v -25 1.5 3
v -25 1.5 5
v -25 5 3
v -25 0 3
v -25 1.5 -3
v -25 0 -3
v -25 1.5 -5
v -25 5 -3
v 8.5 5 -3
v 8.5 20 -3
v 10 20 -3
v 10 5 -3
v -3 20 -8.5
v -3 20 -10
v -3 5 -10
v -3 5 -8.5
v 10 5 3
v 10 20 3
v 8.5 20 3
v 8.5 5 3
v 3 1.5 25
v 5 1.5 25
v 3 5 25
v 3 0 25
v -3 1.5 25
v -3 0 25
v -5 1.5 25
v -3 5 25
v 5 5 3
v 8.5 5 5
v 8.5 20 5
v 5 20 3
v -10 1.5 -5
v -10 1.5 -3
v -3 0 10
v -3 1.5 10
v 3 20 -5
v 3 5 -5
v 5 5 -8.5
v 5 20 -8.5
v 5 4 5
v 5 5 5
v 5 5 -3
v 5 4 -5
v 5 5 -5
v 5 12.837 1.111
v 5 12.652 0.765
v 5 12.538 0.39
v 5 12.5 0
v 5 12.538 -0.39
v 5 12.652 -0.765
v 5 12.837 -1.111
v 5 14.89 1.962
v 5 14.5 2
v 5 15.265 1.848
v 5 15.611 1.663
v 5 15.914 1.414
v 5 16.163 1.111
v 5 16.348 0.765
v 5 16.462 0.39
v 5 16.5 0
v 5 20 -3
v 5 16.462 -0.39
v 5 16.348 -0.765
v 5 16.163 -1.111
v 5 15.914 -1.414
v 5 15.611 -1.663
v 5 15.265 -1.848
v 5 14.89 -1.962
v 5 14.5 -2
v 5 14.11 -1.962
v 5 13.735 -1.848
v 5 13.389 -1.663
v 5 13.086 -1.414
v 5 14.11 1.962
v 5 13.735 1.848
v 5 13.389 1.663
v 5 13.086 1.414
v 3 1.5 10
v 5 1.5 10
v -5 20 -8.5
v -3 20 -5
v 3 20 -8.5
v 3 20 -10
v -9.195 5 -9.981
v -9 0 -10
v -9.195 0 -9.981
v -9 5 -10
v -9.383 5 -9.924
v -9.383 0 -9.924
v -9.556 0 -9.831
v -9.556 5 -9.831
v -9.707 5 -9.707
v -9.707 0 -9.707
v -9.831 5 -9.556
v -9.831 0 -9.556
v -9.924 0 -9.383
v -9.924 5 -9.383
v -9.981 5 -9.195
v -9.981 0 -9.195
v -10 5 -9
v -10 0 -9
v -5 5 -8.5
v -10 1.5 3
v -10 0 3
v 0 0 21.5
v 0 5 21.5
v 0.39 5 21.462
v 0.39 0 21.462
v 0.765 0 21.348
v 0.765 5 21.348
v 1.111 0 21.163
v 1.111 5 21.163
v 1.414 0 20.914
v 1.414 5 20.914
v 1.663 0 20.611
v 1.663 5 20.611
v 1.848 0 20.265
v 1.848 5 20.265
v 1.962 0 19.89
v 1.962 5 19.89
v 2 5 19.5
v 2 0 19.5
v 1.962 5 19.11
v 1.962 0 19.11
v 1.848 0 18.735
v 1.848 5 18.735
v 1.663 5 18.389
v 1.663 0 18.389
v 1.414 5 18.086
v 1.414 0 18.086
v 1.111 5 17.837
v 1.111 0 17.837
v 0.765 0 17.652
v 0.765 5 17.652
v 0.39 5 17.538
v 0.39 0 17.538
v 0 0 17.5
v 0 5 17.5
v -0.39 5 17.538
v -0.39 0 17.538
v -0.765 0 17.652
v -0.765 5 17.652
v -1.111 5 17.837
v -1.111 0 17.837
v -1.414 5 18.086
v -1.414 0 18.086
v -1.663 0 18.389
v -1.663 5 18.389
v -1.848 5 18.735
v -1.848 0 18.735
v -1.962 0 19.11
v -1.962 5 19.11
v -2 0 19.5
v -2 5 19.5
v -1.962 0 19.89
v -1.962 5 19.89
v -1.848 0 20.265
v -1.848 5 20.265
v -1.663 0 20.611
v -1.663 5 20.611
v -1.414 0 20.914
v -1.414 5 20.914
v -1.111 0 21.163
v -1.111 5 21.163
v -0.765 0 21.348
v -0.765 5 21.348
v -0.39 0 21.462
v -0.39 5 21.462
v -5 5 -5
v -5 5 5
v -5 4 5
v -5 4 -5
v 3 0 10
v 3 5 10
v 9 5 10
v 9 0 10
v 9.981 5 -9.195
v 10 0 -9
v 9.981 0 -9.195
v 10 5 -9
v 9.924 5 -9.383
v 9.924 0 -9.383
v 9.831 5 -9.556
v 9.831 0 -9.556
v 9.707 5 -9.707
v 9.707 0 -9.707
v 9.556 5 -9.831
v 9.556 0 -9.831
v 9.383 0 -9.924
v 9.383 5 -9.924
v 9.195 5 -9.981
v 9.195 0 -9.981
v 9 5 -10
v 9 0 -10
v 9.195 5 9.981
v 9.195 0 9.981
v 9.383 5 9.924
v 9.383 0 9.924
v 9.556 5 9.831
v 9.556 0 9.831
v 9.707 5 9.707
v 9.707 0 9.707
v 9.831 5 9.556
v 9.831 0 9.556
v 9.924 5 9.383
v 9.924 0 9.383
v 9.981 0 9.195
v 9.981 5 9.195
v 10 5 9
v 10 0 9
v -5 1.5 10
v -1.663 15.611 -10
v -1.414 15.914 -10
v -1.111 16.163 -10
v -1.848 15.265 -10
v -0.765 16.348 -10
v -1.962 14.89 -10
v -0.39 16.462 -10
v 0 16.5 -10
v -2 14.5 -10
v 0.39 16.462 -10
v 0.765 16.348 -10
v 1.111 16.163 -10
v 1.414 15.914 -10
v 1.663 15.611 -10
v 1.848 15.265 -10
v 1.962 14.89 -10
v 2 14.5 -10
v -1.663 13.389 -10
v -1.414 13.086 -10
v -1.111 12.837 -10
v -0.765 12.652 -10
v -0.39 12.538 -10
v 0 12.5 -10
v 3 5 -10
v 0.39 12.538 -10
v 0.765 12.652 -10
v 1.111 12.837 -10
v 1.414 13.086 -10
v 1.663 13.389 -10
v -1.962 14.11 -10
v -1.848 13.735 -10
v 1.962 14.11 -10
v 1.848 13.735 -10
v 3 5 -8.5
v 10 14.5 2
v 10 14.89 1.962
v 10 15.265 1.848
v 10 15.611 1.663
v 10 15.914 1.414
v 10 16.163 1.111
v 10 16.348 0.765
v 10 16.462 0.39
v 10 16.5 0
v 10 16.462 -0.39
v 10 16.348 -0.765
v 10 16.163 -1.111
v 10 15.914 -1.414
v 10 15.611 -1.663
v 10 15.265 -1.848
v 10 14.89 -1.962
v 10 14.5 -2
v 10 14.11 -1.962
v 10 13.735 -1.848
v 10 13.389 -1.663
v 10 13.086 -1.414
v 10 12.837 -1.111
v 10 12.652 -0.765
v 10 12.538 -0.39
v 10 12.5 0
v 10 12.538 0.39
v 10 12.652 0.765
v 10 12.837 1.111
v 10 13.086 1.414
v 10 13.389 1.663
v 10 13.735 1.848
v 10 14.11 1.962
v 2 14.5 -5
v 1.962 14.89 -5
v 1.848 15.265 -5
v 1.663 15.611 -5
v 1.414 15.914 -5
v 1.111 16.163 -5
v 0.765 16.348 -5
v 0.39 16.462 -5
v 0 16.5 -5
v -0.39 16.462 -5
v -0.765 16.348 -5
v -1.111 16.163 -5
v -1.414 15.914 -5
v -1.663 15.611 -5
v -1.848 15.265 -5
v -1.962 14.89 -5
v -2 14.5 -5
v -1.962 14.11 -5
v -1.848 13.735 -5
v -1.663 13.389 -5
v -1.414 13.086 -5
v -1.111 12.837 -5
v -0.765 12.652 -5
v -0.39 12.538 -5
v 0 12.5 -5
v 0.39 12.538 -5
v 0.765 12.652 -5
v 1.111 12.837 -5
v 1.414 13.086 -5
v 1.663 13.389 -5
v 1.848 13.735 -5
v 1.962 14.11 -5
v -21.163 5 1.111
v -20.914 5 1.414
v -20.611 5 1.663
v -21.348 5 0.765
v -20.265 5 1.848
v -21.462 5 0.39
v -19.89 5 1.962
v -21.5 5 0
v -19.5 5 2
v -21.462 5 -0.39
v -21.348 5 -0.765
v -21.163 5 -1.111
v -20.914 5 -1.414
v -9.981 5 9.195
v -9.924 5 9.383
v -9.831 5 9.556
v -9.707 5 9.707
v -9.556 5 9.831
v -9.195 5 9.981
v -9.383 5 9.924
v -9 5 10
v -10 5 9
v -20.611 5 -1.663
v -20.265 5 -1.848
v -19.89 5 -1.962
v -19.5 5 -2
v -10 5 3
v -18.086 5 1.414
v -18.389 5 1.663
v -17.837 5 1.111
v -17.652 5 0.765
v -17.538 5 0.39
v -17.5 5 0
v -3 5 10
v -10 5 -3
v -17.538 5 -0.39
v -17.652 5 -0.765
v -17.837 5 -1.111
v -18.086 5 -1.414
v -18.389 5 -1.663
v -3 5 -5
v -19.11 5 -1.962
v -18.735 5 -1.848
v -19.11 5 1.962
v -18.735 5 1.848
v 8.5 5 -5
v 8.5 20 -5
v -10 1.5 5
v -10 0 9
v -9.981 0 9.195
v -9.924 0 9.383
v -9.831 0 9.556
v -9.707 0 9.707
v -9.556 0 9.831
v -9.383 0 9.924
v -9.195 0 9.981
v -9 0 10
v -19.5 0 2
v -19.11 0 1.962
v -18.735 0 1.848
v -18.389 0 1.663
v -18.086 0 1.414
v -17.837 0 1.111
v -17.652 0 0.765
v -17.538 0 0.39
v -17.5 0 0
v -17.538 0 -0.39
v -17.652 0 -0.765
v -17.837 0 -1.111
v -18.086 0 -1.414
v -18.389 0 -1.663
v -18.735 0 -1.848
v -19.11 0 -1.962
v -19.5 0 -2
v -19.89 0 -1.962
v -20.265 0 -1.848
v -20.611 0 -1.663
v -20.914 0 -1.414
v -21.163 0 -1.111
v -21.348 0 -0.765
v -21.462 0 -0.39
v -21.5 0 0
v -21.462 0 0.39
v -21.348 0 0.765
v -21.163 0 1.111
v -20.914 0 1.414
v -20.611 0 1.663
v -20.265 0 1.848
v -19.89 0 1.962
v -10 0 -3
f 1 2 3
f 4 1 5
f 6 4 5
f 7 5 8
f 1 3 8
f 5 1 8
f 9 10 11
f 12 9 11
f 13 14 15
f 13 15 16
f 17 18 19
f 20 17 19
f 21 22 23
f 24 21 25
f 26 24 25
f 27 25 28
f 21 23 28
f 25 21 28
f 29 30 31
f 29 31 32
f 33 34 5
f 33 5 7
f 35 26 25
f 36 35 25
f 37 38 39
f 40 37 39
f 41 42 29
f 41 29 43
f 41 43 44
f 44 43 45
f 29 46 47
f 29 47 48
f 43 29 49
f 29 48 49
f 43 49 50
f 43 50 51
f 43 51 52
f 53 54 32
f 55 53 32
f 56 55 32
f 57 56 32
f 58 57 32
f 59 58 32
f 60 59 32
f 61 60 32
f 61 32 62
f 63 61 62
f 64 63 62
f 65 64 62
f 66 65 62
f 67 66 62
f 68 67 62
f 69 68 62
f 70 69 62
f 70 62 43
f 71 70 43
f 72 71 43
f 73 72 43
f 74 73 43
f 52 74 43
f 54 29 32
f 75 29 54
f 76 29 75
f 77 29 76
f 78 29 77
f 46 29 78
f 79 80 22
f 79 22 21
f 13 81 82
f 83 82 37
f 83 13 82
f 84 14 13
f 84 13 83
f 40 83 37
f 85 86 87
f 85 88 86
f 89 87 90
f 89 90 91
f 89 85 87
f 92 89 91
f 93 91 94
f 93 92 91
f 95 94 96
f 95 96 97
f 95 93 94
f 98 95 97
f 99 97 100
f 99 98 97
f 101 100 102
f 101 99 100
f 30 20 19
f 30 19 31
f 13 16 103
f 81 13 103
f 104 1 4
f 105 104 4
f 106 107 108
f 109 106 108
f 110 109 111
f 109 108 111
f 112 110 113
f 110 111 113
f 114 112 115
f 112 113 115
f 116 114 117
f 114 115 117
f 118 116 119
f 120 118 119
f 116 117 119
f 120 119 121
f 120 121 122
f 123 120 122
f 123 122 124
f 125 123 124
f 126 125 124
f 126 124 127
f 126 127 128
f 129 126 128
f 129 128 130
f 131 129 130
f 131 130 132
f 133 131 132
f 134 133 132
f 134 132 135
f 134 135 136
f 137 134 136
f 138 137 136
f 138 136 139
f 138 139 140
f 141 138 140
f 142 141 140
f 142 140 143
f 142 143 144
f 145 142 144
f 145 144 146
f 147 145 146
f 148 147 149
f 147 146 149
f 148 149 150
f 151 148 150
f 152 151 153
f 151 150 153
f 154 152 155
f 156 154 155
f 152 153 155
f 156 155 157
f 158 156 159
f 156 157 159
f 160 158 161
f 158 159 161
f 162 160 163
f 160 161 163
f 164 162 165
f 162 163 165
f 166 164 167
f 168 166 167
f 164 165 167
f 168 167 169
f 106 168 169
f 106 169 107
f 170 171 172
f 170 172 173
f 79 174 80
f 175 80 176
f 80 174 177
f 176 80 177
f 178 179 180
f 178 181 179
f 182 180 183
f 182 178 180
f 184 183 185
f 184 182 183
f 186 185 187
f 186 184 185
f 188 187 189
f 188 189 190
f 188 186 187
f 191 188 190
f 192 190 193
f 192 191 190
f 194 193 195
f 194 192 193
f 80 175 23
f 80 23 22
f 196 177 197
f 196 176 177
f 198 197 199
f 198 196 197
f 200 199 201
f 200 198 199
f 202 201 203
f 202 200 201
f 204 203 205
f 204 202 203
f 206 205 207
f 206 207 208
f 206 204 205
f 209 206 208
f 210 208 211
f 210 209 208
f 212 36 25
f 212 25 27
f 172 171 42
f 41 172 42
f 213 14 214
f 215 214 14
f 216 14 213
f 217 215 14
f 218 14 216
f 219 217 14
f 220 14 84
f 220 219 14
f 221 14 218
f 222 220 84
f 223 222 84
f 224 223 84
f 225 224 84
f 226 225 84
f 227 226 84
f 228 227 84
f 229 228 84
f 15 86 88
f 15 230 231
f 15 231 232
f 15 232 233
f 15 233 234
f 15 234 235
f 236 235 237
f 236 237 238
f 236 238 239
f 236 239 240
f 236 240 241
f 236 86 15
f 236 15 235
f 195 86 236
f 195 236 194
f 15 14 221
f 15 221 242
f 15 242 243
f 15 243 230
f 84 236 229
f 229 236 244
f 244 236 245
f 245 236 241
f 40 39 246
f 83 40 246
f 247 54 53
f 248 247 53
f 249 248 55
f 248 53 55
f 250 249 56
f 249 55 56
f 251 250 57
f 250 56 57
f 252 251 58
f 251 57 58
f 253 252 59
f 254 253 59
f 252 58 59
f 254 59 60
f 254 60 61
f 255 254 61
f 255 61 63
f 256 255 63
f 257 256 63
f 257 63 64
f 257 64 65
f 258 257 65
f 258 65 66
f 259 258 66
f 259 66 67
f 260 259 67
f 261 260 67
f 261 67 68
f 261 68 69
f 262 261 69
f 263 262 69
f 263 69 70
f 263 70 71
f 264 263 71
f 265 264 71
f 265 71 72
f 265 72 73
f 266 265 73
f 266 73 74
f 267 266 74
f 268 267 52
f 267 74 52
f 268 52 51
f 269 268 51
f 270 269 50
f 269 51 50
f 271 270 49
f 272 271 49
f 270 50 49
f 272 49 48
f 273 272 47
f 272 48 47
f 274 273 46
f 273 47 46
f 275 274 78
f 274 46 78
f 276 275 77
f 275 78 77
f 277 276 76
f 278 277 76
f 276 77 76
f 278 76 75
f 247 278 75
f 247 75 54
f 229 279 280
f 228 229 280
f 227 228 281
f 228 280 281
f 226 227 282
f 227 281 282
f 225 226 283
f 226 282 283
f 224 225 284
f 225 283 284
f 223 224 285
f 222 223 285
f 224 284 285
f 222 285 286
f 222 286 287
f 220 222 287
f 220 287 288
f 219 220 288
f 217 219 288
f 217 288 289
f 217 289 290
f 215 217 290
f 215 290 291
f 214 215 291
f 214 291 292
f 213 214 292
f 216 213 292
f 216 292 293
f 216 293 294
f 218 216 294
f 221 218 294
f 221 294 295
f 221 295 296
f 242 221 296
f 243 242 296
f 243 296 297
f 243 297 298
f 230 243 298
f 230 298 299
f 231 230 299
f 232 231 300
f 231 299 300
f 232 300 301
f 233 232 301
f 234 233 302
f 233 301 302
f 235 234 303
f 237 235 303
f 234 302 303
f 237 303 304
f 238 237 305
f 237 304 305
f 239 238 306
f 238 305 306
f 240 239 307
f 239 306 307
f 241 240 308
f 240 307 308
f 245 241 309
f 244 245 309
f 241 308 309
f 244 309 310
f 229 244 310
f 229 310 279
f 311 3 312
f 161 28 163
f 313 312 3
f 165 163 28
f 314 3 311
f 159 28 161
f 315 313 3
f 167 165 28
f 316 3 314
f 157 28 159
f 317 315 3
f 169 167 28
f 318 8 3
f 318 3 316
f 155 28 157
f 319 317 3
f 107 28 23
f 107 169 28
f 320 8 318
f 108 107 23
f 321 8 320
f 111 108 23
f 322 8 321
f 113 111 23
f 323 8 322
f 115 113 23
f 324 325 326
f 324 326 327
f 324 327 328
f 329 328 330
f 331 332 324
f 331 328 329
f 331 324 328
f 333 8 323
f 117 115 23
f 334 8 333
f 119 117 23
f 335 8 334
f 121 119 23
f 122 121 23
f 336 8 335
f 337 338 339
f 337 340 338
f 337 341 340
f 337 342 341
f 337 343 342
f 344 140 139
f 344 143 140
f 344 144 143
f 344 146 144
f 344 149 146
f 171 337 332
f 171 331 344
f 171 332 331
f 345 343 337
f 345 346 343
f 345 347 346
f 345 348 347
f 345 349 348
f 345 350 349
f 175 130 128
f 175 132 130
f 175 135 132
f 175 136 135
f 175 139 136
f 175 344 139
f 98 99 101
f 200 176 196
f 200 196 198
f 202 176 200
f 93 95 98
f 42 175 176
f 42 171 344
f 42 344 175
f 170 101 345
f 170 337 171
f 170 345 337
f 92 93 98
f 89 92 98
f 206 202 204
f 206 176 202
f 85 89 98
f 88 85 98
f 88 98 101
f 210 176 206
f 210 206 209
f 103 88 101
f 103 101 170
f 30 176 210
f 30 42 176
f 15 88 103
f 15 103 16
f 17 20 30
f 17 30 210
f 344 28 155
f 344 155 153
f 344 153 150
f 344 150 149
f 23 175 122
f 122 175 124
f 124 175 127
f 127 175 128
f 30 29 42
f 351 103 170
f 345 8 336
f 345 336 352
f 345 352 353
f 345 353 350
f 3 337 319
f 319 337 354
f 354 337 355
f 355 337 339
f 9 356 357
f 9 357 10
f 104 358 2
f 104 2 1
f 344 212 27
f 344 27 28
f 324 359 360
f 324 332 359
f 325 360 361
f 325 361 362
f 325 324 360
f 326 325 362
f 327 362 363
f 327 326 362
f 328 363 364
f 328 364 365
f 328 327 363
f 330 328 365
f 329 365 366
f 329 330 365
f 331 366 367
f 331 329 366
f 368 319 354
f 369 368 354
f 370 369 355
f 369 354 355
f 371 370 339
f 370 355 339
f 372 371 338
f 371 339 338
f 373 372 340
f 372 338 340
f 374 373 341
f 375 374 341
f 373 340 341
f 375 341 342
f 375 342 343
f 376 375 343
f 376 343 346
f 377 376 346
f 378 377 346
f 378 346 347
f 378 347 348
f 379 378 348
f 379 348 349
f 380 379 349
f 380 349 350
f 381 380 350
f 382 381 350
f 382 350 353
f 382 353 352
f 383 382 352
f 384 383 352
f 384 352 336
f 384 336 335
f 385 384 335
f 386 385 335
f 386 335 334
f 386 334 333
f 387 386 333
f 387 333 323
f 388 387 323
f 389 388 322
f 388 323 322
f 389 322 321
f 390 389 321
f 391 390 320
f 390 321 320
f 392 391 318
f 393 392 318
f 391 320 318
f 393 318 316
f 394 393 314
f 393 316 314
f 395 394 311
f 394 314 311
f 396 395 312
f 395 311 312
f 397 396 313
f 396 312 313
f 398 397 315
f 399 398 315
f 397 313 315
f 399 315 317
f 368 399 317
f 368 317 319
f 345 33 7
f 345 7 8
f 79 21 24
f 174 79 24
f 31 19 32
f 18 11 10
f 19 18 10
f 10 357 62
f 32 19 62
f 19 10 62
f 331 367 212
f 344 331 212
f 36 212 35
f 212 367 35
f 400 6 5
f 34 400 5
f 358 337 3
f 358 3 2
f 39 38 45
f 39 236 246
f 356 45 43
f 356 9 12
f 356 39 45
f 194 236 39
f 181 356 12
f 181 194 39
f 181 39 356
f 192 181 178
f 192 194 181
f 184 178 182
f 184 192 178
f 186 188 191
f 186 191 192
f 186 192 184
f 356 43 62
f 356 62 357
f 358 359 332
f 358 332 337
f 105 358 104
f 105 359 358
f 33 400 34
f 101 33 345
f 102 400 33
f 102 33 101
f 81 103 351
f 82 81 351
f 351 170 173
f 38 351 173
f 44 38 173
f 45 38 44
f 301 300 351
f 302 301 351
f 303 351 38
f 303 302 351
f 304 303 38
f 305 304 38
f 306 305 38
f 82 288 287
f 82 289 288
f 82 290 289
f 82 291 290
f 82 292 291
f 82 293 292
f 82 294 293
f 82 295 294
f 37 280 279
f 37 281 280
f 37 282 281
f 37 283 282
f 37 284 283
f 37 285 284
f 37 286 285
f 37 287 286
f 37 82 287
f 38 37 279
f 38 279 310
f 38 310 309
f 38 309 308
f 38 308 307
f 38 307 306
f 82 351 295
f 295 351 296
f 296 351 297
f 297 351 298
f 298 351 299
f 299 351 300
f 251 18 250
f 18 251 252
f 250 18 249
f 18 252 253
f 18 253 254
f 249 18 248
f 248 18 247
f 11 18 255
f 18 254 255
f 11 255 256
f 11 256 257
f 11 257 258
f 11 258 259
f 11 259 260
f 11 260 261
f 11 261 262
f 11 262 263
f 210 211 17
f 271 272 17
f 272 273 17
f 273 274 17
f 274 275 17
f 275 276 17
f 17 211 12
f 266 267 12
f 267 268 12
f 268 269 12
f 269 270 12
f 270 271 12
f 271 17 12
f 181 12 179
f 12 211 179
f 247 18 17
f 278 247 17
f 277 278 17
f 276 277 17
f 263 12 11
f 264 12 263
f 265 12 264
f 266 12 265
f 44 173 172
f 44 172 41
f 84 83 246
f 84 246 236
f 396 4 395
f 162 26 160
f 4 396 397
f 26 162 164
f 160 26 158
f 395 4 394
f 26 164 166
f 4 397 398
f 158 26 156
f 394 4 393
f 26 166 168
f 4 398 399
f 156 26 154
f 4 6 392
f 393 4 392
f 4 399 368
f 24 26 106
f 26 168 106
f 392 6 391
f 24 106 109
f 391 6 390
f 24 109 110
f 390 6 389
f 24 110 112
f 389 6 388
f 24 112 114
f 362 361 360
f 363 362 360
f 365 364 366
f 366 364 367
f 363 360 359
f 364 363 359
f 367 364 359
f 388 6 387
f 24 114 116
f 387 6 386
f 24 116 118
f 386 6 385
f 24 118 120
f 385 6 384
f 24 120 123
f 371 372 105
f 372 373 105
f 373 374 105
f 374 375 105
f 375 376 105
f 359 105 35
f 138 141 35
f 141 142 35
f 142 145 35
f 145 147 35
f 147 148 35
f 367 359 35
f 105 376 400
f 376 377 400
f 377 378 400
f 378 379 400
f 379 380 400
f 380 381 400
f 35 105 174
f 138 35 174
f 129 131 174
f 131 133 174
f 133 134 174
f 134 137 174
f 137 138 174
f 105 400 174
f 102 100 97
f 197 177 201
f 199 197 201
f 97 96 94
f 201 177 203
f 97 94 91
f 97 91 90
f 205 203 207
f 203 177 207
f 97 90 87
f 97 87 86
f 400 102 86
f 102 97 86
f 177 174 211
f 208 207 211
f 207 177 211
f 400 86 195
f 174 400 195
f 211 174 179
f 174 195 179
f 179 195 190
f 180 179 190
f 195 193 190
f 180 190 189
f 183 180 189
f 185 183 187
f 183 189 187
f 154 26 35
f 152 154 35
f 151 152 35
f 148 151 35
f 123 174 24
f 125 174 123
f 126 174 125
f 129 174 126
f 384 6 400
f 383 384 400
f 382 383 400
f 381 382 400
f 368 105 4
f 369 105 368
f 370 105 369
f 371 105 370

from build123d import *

# Parameters (mm, degrees)
SKETCH_1_W          = 20
SKETCH_1_H          = 20
EXTRUDE_1_DEPTH     = 5
EXTRUDE_2_DEPTH     = 15
EXTRUDE_3_DEPTH     = 15
EXTRUDE_4_DEPTH     = 15
FILLET_1_R          = 1
SKETCH_5_W          = 10
SKETCH_5_H          = 10
CUT_EXTRUDE_1_DEPTH = 1
CUT_EXTRUDE_2_REACH = 40.406
SKETCH_6_R          = 2
CUT_EXTRUDE_3_REACH = 45.875
SKETCH_7_R          = 2
CUT_EXTRUDE_4_REACH = 45.875
SKETCH_8_R          = 2


with BuildPart() as part:
    # 草图1 → 凸台-拉伸1 (new body)
    with BuildSketch(Plane(origin=(0, 0, 0), x_dir=(1, 0, 0), z_dir=(0, 1, 0))):
        Rectangle(SKETCH_1_W, SKETCH_1_H)
    extrude(amount=EXTRUDE_1_DEPTH)

    # 草图2 → 凸台-拉伸2 (add)
    with BuildSketch(Plane.XY.offset(10)):
        Polygon((-3, 5), (3, 5), (5, 1.5), (3, 1.5), (3, 0), (-3, 0), (-3, 1.5), (-5, 1.5), align=None)
    extrude(amount=EXTRUDE_2_DEPTH)

    # 草图3 → 凸台-拉伸3 (add)
    with BuildSketch(Plane.ZY.offset(10)):
        Polygon((-3, 5), (3, 5), (5, 1.5), (3, 1.5), (3, 0), (-3, 0), (-3, 1.5), (-5, 1.5), align=None)
    extrude(amount=EXTRUDE_3_DEPTH)

    # 草图4 → 凸台-拉伸4 (add)
    with BuildSketch(Plane(origin=(0, 5, 0), x_dir=(1, 0, 0), z_dir=(0, 1, 0))):
        Polygon((-3, 10), (-3, 8.5), (-5, 8.5), (-3, 5), (3, 5), (5, 8.5), (3, 8.5), (3, 10), align=None)
        Polygon((8.5, -5), (5, -3), (5, 3), (8.5, 5), (8.5, 3), (10, 3), (10, -3), (8.5, -3), align=None)
    extrude(amount=EXTRUDE_4_DEPTH)

    # 圆角1
    fillet_1_edges = [part.edges().sort_by_distance(p)[0] for p in [
        (10, 2.5, 10),
        (-10, 2.5, 10),
        (-10, 2.5, -10),
        (10, 2.5, -10),
    ]]
    fillet(fillet_1_edges, radius=FILLET_1_R)

    # 草图5 → 切除-拉伸1 (cut)
    with BuildSketch(Plane(origin=(0, 5, 0), x_dir=(1, 0, 0), z_dir=(0, 1, 0))):
        Rectangle(SKETCH_5_W, SKETCH_5_H)
    extrude(amount=-CUT_EXTRUDE_1_DEPTH, mode=Mode.SUBTRACT)

    # 草图6 → 切除-拉伸2 (cut, up to next)
    with BuildSketch(Plane(origin=(0, 5, 0), x_dir=(1, 0, 0), z_dir=(0, 1, 0)), mode=Mode.PRIVATE) as cut_extrude_2_sk1:
        with Locations(Location((0, -19.5, 0), (0, 0, 270))):
            Circle(SKETCH_6_R)
    cut_extrude_2_tool1 = extrude(cut_extrude_2_sk1.sketch, amount=-CUT_EXTRUDE_2_REACH, mode=Mode.PRIVATE) & part.part
    # 草图6 → 切除-拉伸2 (cut, up to next)
    with BuildSketch(Plane(origin=(0, 5, 0), x_dir=(1, 0, 0), z_dir=(0, 1, 0)), mode=Mode.PRIVATE) as cut_extrude_2_sk2:
        with Locations(Location((-19.5, 0, 0), (0, 0, 270))):
            Circle(SKETCH_6_R)
    cut_extrude_2_tool2 = extrude(cut_extrude_2_sk2.sketch, amount=-CUT_EXTRUDE_2_REACH, mode=Mode.PRIVATE) & part.part
    add(cut_extrude_2_tool1.solids().sort_by_distance((0, 5, 19.5))[0], mode=Mode.SUBTRACT)
    add(cut_extrude_2_tool2.solids().sort_by_distance((-19.5, 5, 0))[0], mode=Mode.SUBTRACT)

    # 草图7 → 切除-拉伸3 (cut, up to next)
    with BuildSketch(Plane.ZY.offset(-5), mode=Mode.PRIVATE) as cut_extrude_3_sk1:
        with Locations((0, 14.5)):
            Circle(SKETCH_7_R)
    cut_extrude_3_tool1 = extrude(cut_extrude_3_sk1.sketch, amount=-CUT_EXTRUDE_3_REACH, mode=Mode.PRIVATE) & part.part
    add(cut_extrude_3_tool1.solids().sort_by_distance((5, 14.5, 0))[0], mode=Mode.SUBTRACT)

    # 草图8 → 切除-拉伸4 (cut, up to next)
    with BuildSketch(Plane.XY.offset(-5), mode=Mode.PRIVATE) as cut_extrude_4_sk1:
        with Locations((0, 14.5)):
            Circle(SKETCH_8_R)
    cut_extrude_4_tool1 = extrude(cut_extrude_4_sk1.sketch, amount=-CUT_EXTRUDE_4_REACH, mode=Mode.PRIVATE) & part.part
    add(cut_extrude_4_tool1.solids().sort_by_distance((0, 14.5, -5))[0], mode=Mode.SUBTRACT)


solid = part.part
